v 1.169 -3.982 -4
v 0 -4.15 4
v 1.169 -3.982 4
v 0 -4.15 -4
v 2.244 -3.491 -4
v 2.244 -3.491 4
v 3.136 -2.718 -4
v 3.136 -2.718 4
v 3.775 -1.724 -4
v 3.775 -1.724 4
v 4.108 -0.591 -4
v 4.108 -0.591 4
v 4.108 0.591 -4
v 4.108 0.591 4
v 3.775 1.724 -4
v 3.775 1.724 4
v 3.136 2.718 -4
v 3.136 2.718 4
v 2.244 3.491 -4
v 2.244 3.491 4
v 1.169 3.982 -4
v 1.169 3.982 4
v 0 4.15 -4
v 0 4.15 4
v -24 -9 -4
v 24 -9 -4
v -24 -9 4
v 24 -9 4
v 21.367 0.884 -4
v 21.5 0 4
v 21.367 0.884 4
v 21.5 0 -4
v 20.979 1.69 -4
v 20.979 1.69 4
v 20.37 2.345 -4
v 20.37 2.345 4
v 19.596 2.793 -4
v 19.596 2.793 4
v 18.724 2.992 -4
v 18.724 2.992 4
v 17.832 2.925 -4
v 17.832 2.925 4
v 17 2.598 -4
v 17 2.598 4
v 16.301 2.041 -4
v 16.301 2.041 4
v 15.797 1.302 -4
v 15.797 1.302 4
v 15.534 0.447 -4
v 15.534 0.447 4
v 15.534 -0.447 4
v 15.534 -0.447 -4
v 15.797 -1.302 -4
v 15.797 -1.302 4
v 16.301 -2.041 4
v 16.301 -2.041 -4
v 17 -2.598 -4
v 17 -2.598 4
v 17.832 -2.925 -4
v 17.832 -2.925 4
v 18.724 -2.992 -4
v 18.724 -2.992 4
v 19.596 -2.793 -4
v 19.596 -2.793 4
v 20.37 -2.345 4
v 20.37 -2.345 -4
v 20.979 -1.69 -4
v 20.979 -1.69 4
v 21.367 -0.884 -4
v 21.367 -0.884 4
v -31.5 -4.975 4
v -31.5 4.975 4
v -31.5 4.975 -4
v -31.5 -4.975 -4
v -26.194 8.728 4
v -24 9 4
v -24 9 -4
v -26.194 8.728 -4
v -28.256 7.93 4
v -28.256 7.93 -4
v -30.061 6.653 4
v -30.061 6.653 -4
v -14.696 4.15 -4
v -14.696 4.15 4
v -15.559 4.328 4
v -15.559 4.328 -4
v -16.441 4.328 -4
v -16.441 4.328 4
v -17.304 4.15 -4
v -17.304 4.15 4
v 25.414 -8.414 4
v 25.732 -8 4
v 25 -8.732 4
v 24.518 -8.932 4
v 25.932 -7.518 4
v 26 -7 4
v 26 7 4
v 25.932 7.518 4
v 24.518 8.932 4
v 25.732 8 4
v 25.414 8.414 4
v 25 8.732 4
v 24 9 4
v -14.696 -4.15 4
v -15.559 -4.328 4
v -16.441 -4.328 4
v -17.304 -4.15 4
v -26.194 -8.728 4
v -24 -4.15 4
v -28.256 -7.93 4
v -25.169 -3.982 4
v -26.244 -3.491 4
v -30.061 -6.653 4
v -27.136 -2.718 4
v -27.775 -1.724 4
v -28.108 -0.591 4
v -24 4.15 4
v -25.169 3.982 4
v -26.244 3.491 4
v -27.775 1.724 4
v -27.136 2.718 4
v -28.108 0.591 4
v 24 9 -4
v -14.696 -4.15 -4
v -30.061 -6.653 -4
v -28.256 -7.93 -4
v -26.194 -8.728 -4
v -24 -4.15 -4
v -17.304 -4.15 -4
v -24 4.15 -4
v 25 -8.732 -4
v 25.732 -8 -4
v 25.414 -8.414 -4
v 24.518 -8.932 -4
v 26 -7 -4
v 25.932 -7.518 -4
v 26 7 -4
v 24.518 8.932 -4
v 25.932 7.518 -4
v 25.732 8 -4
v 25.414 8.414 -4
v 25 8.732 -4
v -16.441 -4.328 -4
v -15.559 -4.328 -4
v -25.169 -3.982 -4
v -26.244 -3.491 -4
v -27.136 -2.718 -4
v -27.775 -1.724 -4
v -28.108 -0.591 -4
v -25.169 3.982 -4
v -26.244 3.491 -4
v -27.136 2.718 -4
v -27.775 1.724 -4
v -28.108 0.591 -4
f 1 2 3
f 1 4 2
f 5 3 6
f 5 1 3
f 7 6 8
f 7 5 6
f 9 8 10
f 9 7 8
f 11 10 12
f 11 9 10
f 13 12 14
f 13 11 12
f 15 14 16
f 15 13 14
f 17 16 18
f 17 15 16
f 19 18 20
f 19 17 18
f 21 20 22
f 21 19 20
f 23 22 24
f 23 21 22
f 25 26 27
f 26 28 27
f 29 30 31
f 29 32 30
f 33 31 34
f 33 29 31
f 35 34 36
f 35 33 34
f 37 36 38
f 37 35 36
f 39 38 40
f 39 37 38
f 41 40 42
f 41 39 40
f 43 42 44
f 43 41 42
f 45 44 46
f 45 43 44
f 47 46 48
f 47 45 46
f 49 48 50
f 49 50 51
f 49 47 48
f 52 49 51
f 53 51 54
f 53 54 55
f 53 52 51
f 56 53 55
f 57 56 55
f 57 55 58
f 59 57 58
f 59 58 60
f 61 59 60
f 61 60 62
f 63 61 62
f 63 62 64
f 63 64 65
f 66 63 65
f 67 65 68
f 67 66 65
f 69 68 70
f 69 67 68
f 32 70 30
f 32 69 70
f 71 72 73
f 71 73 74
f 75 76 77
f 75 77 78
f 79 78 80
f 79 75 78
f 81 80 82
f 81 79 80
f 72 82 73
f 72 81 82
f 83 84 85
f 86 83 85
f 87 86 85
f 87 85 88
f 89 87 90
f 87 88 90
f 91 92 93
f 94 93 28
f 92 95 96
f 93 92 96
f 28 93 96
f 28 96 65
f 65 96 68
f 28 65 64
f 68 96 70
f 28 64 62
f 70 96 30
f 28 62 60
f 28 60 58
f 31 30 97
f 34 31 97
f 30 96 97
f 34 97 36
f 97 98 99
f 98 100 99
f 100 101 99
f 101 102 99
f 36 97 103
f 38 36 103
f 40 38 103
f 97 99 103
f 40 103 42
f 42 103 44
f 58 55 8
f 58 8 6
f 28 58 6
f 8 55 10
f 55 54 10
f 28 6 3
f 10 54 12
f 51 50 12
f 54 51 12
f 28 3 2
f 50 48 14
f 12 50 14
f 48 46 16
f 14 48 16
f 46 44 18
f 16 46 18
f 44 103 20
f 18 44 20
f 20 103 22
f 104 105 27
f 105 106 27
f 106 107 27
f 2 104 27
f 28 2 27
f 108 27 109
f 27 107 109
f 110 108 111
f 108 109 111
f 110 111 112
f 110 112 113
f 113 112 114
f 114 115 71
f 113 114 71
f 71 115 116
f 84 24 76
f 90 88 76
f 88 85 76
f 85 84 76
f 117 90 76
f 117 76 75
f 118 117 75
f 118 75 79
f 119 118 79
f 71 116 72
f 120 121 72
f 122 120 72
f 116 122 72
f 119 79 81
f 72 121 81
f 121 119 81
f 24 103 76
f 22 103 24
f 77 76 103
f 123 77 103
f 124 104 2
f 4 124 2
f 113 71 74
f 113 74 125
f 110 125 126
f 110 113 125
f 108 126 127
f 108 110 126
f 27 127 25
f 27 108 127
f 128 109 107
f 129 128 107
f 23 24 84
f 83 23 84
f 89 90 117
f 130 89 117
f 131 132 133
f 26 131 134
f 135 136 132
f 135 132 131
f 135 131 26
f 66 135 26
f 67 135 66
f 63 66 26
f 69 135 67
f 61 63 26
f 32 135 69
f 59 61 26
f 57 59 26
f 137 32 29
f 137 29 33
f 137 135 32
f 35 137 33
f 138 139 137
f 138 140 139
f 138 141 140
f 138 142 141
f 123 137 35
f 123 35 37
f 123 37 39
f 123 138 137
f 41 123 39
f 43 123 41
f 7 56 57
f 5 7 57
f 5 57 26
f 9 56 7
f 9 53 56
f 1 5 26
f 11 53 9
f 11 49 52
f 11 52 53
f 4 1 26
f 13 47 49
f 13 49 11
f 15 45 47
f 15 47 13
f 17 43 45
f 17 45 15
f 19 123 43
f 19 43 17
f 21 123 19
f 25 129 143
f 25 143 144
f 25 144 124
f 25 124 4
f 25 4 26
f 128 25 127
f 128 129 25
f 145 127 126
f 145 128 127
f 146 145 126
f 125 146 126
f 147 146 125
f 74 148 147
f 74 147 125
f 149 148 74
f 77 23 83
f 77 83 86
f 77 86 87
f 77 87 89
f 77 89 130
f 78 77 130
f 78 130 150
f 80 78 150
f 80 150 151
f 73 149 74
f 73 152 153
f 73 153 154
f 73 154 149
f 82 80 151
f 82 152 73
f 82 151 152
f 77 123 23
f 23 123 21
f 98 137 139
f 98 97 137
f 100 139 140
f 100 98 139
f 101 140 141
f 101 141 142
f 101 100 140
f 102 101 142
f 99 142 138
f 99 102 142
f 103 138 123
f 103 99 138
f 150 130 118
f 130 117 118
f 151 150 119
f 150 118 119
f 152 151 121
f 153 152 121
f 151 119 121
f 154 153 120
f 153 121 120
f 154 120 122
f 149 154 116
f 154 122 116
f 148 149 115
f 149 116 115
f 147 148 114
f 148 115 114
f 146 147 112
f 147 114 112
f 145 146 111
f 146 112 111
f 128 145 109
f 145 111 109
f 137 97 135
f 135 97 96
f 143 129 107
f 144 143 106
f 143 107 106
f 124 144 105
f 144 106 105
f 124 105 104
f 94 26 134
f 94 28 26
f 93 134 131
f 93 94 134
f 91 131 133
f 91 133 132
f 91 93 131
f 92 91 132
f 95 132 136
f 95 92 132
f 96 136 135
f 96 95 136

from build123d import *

# Parameters (mm, degrees)
SKETCH_R          = 3
PAD_DEPTH         = 4
SKETCH001_R       = 4.35
POCKET_DEPTH      = 4.001
POCKET_DEPTH_BACK = -4.001


with BuildPart() as part:
    # Sketch → Pad (new body, symmetric)
    with BuildSketch(Plane.XY):
        with BuildLine():
            Line((-24, 9), (24, 9))
            ThreePointArc((26, 7), (25.414214, 8.414214), (24, 9))
            Line((26, 7), (26, -7))
            ThreePointArc((24, -9), (25.414214, -8.414214), (26, -7))
            Line((24, -9), (-24, -9))
            ThreePointArc((-31.499988, -4.974955), (-28.255902, -7.930151), (-24, -9))
            Line((-31.499988, 4.974955), (-31.499988, -4.974955))
            ThreePointArc((-24, 9), (-28.255902, 7.930151), (-31.499988, 4.974955))
        make_face()
        with Locations((18.5, 0)):
            Circle(SKETCH_R, mode=Mode.SUBTRACT)
        with BuildLine():
            ThreePointArc((1.2e-05, -4.15), (4.15, 6e-06), (0, 4.15))
            Line((0, 4.15), (-24, 4.15))
            ThreePointArc((-24, 4.15), (-28.15, 0), (-24, -4.15))
            Line((-24, -4.15), (1.2e-05, -4.15))
        make_face(mode=Mode.SUBTRACT)
    extrude(amount=PAD_DEPTH, both=True)

    # Sketch001 → Pocket (cut, two sides)
    with BuildSketch(Plane.XY) as pocket_sk:
        with Locations((-16, 0)):
            Circle(SKETCH001_R)
    extrude(amount=-POCKET_DEPTH, mode=Mode.SUBTRACT)
    extrude(pocket_sk.sketch, amount=-POCKET_DEPTH_BACK, mode=Mode.SUBTRACT)


solid = part.part
